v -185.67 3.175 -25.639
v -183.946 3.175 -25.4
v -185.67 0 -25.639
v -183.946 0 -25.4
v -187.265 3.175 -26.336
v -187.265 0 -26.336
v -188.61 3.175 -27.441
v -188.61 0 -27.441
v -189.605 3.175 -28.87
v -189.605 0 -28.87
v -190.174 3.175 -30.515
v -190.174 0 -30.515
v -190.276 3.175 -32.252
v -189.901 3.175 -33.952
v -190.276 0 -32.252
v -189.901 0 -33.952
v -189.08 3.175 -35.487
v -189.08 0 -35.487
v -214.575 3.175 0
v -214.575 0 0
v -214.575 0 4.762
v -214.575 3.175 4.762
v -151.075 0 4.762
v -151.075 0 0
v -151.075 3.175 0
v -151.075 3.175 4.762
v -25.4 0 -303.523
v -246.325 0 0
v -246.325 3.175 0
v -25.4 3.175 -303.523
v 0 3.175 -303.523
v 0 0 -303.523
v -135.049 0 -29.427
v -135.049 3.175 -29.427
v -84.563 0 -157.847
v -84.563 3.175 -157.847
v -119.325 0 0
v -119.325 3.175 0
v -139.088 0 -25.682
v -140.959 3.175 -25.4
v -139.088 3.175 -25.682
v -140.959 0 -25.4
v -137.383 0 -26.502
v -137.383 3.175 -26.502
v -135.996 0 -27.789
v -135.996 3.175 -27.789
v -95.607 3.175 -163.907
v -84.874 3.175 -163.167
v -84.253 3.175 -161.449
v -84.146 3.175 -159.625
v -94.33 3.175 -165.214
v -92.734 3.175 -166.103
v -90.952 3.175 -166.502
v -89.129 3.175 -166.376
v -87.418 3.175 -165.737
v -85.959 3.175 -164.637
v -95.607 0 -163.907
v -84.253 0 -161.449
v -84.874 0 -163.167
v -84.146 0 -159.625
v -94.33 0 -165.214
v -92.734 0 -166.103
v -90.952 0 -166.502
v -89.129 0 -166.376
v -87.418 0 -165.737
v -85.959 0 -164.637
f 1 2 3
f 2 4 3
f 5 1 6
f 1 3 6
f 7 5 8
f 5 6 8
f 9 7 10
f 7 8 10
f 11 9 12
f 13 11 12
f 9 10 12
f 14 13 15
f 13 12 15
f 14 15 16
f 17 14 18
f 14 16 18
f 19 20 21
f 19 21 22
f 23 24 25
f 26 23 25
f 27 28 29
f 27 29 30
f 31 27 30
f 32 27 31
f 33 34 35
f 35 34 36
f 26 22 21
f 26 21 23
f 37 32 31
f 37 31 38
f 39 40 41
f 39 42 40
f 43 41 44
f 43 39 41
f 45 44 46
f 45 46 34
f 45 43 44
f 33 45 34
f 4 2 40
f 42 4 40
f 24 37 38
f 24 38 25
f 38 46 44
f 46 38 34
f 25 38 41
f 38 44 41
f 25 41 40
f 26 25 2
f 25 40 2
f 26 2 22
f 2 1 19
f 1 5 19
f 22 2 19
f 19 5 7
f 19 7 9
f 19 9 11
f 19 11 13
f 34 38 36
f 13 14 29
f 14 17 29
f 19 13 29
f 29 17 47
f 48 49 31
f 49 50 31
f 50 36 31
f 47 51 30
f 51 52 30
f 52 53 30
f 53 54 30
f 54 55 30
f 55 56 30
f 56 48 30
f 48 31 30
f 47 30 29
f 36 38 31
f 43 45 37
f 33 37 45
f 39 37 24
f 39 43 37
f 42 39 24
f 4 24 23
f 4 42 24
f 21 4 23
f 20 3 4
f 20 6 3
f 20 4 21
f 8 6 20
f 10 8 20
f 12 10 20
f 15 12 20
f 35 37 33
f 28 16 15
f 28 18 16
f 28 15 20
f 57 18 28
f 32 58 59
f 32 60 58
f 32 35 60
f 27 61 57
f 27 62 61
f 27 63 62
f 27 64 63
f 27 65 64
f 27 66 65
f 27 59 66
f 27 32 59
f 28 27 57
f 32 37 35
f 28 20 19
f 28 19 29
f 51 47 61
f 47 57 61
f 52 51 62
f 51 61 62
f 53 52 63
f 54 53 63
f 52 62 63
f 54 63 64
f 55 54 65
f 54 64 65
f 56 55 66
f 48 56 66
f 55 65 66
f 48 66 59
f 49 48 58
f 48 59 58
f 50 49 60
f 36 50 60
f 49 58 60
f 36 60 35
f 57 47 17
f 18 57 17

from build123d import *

# Parameters (mm, degrees)
BOSS_EXTRUDE1_DEPTH = 3.175
CUT_EXTRUDE1_DEPTH  = 3.175
FILLET1_R           = 6.35
SKETCH3_W           = 63.5
SKETCH3_H           = 3.175
BOSS_EXTRUDE2_DEPTH = 4.7625


with BuildPart() as part:
    # Sketch1 → Boss-Extrude1 (new body)
    with BuildSketch(Plane(origin=(0, 0, 0), x_dir=(1, 0, 0), z_dir=(0, 1, 0))):
        Polygon((-119.32539, 0), (-246.32539, 0), (-25.4, 303.52288513), (0, 303.52288513), align=None)
    extrude(amount=BOSS_EXTRUDE1_DEPTH)

    # Sketch2 → Cut-Extrude1 (cut)
    with BuildSketch(Plane(origin=(0, 3.175, 0), x_dir=(1, 0, 0), z_dir=(0, 1, 0))):
        Polygon((-136.632122874, 25.4), (-66.411730064, 204.016606412), (-196.421509772, 25.4), align=None)
    extrude(amount=-CUT_EXTRUDE1_DEPTH, mode=Mode.SUBTRACT)

    # Fillet1
    fillet1_edges = [part.edges().sort_by_distance(p)[0] for p in [
        (-136.632122874, 1.5875, -25.4),
        (-196.421509772, 1.5875, -25.4),
        (-66.411730064, 1.5875, -204.016606412),
    ]]
    fillet(fillet1_edges, radius=FILLET1_R)

    # Sketch3 → Boss-Extrude2 (add)
    with BuildSketch(Plane.XY):
        with Locations((-182.82539, 1.5875)):
            Rectangle(SKETCH3_W, SKETCH3_H)
    extrude(amount=BOSS_EXTRUDE2_DEPTH)


solid = part.part
